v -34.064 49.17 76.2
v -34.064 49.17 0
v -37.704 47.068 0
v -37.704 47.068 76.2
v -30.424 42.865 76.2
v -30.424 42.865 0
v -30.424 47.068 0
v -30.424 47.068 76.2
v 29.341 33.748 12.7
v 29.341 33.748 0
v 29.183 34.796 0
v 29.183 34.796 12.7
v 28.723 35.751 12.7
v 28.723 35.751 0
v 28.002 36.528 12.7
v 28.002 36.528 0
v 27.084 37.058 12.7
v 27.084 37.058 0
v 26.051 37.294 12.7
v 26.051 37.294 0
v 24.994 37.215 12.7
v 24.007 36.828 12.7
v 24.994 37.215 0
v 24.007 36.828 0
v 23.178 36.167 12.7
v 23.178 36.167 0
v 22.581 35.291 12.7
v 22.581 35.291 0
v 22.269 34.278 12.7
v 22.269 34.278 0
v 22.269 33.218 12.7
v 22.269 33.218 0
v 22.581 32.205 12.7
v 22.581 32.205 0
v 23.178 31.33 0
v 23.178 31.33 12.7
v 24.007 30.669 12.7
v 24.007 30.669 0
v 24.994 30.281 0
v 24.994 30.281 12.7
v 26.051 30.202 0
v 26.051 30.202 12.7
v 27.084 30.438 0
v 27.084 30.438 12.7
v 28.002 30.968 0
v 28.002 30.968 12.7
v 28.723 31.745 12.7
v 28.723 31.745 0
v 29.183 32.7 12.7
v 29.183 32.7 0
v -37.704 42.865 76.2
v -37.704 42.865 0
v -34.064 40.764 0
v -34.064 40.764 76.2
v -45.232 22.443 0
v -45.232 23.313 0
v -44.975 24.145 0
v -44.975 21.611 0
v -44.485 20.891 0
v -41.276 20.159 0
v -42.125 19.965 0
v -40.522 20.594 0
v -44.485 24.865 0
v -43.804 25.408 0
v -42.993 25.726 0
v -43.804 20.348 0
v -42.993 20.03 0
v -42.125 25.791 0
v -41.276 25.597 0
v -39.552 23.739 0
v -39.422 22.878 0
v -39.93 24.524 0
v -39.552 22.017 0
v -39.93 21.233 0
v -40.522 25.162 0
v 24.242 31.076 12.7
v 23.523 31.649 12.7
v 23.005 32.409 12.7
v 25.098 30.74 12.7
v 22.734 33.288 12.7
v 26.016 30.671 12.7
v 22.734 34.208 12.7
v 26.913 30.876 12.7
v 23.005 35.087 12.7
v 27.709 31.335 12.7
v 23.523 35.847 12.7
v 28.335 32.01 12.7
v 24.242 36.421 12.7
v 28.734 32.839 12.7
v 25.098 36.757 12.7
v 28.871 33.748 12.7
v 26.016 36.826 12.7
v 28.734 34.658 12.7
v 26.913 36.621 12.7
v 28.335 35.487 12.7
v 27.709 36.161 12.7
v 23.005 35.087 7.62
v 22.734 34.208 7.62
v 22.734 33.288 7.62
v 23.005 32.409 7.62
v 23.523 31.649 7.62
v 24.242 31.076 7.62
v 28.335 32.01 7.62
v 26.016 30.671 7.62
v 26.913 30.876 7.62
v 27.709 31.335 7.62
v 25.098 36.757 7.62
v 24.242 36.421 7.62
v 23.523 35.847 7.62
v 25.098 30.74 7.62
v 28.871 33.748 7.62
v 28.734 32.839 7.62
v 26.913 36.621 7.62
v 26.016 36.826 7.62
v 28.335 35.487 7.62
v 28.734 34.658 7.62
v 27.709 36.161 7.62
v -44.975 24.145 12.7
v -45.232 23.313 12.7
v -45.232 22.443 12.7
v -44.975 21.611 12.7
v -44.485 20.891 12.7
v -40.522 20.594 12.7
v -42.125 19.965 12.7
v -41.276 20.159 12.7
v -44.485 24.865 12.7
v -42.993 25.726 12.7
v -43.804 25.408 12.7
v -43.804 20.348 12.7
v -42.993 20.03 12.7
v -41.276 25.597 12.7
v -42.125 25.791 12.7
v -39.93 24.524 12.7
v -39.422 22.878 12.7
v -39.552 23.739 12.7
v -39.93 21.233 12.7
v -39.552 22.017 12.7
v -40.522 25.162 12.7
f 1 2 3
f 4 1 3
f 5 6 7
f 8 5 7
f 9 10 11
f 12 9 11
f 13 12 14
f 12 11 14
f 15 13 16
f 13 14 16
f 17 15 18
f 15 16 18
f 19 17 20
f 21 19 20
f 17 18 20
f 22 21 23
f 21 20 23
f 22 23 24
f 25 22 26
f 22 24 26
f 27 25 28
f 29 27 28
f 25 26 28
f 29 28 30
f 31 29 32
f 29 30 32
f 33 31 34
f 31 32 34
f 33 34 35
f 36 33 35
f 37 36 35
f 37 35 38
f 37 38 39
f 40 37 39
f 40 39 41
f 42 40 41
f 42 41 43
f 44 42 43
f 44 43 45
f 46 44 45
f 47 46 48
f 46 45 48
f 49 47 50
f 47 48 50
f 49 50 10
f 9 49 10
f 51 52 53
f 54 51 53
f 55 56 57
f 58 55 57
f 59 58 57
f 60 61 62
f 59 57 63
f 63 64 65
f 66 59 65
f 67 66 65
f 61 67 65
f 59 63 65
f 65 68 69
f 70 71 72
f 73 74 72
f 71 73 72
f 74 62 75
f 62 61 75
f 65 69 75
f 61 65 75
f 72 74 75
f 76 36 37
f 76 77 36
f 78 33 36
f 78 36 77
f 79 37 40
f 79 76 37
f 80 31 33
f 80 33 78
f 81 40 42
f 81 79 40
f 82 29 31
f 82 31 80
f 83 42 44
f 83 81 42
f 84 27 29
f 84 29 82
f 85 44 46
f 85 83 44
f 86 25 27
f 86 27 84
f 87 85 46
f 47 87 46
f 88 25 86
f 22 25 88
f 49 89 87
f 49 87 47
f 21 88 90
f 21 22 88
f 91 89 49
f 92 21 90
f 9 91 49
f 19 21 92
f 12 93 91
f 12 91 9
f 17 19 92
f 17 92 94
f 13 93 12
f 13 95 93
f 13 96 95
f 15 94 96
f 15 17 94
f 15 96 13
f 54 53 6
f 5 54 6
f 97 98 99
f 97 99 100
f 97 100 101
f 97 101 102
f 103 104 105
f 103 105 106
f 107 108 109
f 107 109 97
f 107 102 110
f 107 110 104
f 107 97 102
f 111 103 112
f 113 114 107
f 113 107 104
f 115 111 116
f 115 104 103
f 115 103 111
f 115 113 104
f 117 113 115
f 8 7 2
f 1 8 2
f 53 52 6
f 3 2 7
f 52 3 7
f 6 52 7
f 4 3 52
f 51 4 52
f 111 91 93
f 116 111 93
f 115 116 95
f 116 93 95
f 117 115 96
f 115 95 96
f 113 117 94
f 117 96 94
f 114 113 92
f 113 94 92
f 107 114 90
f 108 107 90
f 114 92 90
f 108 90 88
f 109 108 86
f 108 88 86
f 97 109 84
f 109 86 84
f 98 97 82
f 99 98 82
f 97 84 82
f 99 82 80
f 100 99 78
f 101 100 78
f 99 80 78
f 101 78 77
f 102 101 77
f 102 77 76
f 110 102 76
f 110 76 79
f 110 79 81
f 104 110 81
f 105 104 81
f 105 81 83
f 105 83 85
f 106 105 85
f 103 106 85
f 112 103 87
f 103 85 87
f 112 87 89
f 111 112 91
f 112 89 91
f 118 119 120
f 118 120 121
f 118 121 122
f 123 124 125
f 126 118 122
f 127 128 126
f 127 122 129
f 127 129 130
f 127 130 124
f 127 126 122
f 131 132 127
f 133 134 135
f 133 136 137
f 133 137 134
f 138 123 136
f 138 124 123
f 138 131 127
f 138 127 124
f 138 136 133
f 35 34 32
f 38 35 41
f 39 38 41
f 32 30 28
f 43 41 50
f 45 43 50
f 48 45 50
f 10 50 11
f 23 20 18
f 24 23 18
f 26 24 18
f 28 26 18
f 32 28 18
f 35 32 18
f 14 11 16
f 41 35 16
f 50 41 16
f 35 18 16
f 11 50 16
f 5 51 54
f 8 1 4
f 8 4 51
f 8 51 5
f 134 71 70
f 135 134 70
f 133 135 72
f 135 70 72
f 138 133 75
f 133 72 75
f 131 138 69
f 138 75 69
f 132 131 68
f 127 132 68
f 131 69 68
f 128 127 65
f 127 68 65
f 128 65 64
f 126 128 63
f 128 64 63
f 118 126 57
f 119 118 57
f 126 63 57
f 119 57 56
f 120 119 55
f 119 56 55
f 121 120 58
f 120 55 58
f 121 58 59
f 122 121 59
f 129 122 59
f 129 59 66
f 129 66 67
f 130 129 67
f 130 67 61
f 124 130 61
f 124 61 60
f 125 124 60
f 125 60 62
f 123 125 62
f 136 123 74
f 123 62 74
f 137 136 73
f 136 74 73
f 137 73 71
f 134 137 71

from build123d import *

# Parameters (mm, degrees)
F1_DEPTH = 76.2
F2_R     = 3.556
F3_DEPTH = 12.7
F4_R     = 3.0861
F5_DEPTH = 5.08
F6_R     = 2.921
F7_DEPTH = 12.7


with BuildPart() as f1:
    # F0 (on Top) → F1 (new body)
    with BuildSketch(Plane.XY):
        Polygon((-30.42393, 42.865115), (-30.42393, 47.068295), (-34.063991, 49.169886), (-37.704052, 47.068295), (-37.704052, 42.865115), (-34.063991, 40.763524), align=None)
    extrude(amount=F1_DEPTH)


with BuildPart() as f3:
    # F2 (on Top) → F3 (new body)
    with BuildSketch(Plane.XY):
        with Locations((25.785213, 33.748295)):
            Circle(F2_R)
    extrude(amount=F3_DEPTH)

    # F4 (on face) → F5 (cut)
    with BuildSketch(Plane.XY.offset(12.7)):
        with Locations((25.785213, 33.748295)):
            Circle(F4_R)
    extrude(amount=-F5_DEPTH, mode=Mode.SUBTRACT)


with BuildPart() as f7:
    # F6 (on Top) → F7 (new body)
    with BuildSketch(Plane.XY):
        with Locations((-42.343367, 22.878056)):
            Circle(F6_R)
    extrude(amount=F7_DEPTH)


solid = Compound([f1.part, f3.part, f7.part])
